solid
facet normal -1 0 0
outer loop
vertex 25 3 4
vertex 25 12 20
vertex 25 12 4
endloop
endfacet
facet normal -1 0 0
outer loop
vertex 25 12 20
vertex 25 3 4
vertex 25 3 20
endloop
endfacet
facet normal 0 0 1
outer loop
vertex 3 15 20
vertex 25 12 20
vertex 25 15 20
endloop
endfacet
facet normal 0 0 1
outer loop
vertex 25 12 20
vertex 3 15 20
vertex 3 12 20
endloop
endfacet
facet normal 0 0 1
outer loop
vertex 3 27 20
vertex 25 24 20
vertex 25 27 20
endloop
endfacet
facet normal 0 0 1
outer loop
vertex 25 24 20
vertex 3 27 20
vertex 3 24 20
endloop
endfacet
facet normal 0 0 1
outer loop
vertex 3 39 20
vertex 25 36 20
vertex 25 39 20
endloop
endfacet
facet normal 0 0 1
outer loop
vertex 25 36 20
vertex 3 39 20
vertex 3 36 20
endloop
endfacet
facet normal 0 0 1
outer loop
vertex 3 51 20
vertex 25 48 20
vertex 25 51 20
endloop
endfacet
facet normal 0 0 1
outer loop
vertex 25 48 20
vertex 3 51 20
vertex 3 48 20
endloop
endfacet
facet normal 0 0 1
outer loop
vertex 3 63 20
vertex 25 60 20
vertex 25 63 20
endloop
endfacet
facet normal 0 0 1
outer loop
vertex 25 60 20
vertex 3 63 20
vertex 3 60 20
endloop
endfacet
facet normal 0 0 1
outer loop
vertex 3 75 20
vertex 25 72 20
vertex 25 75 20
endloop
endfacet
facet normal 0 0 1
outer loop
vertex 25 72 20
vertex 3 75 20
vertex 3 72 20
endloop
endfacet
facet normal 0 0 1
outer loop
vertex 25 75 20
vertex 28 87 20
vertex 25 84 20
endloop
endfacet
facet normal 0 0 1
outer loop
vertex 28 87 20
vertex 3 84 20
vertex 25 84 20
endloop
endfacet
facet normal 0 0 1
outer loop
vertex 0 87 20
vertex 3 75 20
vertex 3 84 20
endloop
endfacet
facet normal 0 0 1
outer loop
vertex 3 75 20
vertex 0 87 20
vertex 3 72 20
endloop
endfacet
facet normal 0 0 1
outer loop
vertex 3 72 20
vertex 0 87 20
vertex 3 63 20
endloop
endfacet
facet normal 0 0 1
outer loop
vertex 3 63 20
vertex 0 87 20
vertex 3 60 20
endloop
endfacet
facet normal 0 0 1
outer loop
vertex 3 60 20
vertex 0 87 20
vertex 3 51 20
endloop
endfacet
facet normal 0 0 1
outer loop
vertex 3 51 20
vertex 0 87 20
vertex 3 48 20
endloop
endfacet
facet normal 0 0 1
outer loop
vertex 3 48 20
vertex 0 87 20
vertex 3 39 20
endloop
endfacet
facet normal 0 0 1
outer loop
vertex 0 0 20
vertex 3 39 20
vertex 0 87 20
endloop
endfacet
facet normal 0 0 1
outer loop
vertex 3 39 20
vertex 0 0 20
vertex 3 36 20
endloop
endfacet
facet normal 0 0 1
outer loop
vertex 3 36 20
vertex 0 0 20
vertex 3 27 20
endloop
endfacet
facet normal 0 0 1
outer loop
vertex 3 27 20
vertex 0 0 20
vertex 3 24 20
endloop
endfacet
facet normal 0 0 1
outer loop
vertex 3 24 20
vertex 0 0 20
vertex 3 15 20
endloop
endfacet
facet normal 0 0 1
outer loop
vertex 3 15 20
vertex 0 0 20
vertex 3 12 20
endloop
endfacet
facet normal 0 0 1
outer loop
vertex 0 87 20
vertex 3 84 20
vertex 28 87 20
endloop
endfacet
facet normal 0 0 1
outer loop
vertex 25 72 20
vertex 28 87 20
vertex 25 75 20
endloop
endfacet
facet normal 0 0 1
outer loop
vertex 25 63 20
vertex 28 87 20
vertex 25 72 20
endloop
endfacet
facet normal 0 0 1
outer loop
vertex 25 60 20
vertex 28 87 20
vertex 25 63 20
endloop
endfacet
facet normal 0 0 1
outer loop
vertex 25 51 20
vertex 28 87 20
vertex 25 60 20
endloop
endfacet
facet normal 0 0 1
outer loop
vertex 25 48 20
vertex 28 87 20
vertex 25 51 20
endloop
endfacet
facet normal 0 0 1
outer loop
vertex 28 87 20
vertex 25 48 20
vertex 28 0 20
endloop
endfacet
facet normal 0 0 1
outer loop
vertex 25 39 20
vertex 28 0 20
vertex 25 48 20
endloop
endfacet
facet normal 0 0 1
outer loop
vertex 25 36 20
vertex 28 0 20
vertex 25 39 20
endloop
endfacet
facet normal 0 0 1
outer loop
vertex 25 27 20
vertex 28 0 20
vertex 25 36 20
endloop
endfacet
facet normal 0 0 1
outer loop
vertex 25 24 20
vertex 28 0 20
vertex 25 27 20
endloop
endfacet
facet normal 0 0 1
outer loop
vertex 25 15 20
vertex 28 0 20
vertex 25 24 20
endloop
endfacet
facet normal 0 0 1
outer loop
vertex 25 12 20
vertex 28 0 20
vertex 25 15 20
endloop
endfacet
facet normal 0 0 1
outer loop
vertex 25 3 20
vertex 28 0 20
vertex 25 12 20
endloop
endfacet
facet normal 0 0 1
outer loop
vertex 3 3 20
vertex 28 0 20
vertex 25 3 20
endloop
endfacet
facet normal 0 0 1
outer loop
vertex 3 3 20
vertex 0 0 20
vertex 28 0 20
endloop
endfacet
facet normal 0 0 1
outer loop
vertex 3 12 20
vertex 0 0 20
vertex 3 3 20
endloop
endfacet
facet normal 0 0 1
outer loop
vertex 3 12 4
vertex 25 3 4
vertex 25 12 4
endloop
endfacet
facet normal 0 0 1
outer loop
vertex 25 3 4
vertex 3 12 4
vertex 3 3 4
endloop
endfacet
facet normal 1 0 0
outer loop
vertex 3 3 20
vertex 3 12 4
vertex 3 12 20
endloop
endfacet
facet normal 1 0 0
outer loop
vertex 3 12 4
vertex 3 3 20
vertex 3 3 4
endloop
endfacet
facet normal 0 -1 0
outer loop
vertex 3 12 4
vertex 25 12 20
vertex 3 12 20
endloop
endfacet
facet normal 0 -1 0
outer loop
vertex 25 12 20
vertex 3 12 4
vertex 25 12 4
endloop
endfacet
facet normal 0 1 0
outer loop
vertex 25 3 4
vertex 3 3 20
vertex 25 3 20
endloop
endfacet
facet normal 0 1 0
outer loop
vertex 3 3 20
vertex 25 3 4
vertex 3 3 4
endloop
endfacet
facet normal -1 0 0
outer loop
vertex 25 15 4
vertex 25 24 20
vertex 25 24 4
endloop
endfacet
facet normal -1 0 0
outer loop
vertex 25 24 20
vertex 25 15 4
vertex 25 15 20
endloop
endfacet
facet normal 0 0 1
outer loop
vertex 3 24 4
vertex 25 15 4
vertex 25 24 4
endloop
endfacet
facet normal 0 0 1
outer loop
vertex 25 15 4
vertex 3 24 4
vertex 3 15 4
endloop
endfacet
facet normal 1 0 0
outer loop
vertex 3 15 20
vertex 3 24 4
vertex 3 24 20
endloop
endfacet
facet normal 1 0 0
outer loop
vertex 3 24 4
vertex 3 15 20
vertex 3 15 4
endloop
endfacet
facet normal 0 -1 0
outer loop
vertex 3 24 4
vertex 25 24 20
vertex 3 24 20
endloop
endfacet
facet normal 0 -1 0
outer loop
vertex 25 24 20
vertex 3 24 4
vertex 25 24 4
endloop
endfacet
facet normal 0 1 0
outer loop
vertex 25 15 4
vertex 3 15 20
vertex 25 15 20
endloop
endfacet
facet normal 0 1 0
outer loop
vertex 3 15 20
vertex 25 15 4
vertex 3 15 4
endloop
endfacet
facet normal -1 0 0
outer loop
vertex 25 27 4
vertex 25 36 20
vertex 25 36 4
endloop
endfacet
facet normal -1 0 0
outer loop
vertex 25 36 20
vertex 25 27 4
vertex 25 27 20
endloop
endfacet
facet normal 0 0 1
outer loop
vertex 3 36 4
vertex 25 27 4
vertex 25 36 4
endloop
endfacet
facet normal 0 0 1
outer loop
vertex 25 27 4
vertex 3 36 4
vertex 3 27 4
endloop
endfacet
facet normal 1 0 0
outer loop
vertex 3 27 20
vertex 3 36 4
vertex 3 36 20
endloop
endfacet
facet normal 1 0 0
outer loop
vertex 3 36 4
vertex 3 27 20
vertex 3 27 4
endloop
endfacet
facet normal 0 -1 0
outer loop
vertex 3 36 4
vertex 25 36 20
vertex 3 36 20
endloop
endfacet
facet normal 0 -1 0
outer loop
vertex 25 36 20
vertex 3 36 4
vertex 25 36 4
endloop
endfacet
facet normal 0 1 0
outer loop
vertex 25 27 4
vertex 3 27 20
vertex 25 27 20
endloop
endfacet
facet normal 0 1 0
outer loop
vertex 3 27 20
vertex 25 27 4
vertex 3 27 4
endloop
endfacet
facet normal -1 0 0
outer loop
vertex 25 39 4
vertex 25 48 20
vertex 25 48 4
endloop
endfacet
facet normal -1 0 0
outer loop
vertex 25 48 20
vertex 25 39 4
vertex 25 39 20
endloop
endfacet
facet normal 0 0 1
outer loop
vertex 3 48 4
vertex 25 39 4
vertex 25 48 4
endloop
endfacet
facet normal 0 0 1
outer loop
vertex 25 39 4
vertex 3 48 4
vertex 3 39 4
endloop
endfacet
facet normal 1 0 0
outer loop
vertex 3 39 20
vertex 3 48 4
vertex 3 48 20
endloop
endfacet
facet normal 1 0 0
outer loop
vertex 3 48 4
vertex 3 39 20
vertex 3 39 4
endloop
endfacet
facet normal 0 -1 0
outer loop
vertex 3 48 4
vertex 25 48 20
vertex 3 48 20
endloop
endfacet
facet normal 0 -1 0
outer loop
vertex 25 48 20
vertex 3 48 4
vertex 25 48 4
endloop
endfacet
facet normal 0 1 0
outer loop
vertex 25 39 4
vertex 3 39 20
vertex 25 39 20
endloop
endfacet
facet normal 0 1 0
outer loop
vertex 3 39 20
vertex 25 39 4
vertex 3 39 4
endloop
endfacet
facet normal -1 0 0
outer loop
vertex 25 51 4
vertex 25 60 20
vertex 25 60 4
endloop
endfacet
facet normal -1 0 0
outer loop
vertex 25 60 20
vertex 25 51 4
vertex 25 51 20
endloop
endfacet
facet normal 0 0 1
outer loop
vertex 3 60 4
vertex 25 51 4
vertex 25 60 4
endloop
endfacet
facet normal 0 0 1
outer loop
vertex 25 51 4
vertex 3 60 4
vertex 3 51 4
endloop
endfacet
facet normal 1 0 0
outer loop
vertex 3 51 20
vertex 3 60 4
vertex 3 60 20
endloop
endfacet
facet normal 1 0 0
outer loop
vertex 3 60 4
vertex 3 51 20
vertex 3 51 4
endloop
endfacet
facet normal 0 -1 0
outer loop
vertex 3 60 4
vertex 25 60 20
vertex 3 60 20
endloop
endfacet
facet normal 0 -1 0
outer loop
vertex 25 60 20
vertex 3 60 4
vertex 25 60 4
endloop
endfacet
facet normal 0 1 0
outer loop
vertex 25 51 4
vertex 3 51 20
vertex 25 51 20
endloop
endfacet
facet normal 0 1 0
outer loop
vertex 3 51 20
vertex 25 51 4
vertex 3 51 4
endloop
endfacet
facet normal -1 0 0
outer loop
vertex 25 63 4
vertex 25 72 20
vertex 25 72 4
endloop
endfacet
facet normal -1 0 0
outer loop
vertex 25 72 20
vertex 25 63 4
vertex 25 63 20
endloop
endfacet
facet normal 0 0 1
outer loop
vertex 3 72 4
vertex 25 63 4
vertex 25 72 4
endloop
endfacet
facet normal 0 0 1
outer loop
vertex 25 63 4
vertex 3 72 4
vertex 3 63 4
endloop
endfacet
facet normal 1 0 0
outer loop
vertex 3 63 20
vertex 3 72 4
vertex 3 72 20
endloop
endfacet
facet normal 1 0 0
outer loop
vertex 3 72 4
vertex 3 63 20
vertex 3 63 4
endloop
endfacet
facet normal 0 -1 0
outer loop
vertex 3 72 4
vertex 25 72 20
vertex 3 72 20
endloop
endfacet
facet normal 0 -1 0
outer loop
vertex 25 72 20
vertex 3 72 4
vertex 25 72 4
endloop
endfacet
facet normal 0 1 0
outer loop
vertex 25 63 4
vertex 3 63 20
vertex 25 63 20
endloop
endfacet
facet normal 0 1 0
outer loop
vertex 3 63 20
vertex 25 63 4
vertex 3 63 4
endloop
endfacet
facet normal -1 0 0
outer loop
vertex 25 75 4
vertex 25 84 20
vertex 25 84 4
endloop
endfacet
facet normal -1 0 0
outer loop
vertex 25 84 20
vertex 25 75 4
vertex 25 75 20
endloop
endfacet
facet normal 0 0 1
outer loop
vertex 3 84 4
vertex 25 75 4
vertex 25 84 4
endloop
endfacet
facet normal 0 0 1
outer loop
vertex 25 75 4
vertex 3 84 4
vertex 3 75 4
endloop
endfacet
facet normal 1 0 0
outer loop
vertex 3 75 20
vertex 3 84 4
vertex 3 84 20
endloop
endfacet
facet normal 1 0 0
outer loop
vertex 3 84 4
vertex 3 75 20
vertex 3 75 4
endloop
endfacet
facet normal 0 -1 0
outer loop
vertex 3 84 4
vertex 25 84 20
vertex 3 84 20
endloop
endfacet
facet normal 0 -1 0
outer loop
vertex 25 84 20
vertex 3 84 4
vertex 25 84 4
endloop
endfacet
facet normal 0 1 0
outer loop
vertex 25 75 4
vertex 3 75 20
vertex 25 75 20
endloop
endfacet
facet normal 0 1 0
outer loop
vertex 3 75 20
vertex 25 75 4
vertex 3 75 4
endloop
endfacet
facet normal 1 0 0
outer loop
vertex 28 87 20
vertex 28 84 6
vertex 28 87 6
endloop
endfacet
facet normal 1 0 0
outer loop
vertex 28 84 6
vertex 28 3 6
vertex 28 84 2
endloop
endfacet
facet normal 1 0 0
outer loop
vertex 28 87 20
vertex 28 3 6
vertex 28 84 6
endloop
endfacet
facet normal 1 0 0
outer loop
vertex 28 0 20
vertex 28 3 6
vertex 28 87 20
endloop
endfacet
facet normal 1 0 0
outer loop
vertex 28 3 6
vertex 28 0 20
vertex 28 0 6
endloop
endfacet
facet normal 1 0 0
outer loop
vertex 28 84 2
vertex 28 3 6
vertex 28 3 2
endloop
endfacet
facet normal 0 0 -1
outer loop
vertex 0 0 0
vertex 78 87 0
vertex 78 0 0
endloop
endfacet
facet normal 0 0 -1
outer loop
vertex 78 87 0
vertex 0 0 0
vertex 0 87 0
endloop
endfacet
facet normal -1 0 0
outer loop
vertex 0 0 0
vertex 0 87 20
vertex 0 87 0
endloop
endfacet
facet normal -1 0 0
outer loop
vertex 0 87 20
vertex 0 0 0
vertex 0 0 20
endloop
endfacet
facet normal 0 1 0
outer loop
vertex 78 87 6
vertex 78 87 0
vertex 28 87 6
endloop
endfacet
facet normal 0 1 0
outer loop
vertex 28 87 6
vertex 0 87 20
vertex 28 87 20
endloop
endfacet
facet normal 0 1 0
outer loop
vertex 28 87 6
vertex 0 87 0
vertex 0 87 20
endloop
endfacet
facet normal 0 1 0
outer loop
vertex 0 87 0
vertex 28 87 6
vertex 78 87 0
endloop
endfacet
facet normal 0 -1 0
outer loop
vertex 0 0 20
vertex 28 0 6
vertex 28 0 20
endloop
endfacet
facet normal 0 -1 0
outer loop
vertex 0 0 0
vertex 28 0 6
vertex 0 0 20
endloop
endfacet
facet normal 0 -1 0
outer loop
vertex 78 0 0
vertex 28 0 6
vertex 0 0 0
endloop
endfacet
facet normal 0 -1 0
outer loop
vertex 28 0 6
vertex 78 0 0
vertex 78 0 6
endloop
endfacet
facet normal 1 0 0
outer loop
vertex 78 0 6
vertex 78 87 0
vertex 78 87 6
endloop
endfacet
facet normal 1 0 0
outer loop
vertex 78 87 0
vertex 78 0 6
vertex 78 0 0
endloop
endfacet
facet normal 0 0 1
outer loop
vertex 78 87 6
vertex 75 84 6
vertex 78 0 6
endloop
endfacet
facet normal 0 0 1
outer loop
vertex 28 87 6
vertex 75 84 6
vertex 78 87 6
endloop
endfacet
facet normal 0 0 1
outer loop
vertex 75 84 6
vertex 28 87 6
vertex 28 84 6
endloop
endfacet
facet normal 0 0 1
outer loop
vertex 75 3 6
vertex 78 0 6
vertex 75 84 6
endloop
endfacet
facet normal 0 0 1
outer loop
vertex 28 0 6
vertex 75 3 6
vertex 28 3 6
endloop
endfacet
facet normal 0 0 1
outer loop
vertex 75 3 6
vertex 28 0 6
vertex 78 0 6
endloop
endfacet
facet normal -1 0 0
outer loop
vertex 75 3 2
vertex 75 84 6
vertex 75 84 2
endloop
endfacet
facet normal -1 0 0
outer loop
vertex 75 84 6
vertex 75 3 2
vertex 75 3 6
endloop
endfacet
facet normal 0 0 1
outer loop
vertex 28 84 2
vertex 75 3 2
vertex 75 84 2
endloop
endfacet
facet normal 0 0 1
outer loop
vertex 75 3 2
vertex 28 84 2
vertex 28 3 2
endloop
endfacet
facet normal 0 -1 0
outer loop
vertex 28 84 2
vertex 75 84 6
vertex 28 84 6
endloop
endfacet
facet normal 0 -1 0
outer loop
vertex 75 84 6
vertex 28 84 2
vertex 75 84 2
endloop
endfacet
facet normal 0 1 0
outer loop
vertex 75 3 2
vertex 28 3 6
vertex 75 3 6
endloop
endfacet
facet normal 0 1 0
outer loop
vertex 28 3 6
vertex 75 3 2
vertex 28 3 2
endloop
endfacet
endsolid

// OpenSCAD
/* [Common] */
battery_number = 7;
// For no tray, use 0.
tray_depth = 50;

/* [Full] */
// For walls and dividers
gap = 3;
battery_width = 22;
battery_height = 16;
battery_depth = 9;
base_thickness = 4;

/* [Hidden] */
real_tray_depth = (tray_depth == "") ? 0 : tray_depth;

module hubsan_battery_holder(
	bat_num = 7,
	gap = 3,
	bat_width = 9,
	bat_height = 16,
	bat_depth = 22,
	holder_base = 4,
	tray_depth = 50
	){

	total_width  = bat_num * (bat_width + gap) + gap;

	difference(){
		cube([  bat_depth + (gap * 2), 
				total_width,
				bat_height + holder_base]);

		translate([gap,gap,holder_base])
		for (i = [0 : bat_num-1])
		{
			translate([0,i*(gap + bat_width),0])
				cube([bat_depth,bat_width,bat_height]);
		}
		
	}
	translate([bat_depth + (gap*2),0,0])
	difference(){
		cube([tray_depth,total_width,6]);
		translate([0,gap,2])
			cube([tray_depth-gap,total_width-gap*2,4]);
	}
}

hubsan_battery_holder(
	battery_number,
	gap,
	battery_depth,
	battery_height,
	battery_width,
	base_thickness,
	real_tray_depth);
